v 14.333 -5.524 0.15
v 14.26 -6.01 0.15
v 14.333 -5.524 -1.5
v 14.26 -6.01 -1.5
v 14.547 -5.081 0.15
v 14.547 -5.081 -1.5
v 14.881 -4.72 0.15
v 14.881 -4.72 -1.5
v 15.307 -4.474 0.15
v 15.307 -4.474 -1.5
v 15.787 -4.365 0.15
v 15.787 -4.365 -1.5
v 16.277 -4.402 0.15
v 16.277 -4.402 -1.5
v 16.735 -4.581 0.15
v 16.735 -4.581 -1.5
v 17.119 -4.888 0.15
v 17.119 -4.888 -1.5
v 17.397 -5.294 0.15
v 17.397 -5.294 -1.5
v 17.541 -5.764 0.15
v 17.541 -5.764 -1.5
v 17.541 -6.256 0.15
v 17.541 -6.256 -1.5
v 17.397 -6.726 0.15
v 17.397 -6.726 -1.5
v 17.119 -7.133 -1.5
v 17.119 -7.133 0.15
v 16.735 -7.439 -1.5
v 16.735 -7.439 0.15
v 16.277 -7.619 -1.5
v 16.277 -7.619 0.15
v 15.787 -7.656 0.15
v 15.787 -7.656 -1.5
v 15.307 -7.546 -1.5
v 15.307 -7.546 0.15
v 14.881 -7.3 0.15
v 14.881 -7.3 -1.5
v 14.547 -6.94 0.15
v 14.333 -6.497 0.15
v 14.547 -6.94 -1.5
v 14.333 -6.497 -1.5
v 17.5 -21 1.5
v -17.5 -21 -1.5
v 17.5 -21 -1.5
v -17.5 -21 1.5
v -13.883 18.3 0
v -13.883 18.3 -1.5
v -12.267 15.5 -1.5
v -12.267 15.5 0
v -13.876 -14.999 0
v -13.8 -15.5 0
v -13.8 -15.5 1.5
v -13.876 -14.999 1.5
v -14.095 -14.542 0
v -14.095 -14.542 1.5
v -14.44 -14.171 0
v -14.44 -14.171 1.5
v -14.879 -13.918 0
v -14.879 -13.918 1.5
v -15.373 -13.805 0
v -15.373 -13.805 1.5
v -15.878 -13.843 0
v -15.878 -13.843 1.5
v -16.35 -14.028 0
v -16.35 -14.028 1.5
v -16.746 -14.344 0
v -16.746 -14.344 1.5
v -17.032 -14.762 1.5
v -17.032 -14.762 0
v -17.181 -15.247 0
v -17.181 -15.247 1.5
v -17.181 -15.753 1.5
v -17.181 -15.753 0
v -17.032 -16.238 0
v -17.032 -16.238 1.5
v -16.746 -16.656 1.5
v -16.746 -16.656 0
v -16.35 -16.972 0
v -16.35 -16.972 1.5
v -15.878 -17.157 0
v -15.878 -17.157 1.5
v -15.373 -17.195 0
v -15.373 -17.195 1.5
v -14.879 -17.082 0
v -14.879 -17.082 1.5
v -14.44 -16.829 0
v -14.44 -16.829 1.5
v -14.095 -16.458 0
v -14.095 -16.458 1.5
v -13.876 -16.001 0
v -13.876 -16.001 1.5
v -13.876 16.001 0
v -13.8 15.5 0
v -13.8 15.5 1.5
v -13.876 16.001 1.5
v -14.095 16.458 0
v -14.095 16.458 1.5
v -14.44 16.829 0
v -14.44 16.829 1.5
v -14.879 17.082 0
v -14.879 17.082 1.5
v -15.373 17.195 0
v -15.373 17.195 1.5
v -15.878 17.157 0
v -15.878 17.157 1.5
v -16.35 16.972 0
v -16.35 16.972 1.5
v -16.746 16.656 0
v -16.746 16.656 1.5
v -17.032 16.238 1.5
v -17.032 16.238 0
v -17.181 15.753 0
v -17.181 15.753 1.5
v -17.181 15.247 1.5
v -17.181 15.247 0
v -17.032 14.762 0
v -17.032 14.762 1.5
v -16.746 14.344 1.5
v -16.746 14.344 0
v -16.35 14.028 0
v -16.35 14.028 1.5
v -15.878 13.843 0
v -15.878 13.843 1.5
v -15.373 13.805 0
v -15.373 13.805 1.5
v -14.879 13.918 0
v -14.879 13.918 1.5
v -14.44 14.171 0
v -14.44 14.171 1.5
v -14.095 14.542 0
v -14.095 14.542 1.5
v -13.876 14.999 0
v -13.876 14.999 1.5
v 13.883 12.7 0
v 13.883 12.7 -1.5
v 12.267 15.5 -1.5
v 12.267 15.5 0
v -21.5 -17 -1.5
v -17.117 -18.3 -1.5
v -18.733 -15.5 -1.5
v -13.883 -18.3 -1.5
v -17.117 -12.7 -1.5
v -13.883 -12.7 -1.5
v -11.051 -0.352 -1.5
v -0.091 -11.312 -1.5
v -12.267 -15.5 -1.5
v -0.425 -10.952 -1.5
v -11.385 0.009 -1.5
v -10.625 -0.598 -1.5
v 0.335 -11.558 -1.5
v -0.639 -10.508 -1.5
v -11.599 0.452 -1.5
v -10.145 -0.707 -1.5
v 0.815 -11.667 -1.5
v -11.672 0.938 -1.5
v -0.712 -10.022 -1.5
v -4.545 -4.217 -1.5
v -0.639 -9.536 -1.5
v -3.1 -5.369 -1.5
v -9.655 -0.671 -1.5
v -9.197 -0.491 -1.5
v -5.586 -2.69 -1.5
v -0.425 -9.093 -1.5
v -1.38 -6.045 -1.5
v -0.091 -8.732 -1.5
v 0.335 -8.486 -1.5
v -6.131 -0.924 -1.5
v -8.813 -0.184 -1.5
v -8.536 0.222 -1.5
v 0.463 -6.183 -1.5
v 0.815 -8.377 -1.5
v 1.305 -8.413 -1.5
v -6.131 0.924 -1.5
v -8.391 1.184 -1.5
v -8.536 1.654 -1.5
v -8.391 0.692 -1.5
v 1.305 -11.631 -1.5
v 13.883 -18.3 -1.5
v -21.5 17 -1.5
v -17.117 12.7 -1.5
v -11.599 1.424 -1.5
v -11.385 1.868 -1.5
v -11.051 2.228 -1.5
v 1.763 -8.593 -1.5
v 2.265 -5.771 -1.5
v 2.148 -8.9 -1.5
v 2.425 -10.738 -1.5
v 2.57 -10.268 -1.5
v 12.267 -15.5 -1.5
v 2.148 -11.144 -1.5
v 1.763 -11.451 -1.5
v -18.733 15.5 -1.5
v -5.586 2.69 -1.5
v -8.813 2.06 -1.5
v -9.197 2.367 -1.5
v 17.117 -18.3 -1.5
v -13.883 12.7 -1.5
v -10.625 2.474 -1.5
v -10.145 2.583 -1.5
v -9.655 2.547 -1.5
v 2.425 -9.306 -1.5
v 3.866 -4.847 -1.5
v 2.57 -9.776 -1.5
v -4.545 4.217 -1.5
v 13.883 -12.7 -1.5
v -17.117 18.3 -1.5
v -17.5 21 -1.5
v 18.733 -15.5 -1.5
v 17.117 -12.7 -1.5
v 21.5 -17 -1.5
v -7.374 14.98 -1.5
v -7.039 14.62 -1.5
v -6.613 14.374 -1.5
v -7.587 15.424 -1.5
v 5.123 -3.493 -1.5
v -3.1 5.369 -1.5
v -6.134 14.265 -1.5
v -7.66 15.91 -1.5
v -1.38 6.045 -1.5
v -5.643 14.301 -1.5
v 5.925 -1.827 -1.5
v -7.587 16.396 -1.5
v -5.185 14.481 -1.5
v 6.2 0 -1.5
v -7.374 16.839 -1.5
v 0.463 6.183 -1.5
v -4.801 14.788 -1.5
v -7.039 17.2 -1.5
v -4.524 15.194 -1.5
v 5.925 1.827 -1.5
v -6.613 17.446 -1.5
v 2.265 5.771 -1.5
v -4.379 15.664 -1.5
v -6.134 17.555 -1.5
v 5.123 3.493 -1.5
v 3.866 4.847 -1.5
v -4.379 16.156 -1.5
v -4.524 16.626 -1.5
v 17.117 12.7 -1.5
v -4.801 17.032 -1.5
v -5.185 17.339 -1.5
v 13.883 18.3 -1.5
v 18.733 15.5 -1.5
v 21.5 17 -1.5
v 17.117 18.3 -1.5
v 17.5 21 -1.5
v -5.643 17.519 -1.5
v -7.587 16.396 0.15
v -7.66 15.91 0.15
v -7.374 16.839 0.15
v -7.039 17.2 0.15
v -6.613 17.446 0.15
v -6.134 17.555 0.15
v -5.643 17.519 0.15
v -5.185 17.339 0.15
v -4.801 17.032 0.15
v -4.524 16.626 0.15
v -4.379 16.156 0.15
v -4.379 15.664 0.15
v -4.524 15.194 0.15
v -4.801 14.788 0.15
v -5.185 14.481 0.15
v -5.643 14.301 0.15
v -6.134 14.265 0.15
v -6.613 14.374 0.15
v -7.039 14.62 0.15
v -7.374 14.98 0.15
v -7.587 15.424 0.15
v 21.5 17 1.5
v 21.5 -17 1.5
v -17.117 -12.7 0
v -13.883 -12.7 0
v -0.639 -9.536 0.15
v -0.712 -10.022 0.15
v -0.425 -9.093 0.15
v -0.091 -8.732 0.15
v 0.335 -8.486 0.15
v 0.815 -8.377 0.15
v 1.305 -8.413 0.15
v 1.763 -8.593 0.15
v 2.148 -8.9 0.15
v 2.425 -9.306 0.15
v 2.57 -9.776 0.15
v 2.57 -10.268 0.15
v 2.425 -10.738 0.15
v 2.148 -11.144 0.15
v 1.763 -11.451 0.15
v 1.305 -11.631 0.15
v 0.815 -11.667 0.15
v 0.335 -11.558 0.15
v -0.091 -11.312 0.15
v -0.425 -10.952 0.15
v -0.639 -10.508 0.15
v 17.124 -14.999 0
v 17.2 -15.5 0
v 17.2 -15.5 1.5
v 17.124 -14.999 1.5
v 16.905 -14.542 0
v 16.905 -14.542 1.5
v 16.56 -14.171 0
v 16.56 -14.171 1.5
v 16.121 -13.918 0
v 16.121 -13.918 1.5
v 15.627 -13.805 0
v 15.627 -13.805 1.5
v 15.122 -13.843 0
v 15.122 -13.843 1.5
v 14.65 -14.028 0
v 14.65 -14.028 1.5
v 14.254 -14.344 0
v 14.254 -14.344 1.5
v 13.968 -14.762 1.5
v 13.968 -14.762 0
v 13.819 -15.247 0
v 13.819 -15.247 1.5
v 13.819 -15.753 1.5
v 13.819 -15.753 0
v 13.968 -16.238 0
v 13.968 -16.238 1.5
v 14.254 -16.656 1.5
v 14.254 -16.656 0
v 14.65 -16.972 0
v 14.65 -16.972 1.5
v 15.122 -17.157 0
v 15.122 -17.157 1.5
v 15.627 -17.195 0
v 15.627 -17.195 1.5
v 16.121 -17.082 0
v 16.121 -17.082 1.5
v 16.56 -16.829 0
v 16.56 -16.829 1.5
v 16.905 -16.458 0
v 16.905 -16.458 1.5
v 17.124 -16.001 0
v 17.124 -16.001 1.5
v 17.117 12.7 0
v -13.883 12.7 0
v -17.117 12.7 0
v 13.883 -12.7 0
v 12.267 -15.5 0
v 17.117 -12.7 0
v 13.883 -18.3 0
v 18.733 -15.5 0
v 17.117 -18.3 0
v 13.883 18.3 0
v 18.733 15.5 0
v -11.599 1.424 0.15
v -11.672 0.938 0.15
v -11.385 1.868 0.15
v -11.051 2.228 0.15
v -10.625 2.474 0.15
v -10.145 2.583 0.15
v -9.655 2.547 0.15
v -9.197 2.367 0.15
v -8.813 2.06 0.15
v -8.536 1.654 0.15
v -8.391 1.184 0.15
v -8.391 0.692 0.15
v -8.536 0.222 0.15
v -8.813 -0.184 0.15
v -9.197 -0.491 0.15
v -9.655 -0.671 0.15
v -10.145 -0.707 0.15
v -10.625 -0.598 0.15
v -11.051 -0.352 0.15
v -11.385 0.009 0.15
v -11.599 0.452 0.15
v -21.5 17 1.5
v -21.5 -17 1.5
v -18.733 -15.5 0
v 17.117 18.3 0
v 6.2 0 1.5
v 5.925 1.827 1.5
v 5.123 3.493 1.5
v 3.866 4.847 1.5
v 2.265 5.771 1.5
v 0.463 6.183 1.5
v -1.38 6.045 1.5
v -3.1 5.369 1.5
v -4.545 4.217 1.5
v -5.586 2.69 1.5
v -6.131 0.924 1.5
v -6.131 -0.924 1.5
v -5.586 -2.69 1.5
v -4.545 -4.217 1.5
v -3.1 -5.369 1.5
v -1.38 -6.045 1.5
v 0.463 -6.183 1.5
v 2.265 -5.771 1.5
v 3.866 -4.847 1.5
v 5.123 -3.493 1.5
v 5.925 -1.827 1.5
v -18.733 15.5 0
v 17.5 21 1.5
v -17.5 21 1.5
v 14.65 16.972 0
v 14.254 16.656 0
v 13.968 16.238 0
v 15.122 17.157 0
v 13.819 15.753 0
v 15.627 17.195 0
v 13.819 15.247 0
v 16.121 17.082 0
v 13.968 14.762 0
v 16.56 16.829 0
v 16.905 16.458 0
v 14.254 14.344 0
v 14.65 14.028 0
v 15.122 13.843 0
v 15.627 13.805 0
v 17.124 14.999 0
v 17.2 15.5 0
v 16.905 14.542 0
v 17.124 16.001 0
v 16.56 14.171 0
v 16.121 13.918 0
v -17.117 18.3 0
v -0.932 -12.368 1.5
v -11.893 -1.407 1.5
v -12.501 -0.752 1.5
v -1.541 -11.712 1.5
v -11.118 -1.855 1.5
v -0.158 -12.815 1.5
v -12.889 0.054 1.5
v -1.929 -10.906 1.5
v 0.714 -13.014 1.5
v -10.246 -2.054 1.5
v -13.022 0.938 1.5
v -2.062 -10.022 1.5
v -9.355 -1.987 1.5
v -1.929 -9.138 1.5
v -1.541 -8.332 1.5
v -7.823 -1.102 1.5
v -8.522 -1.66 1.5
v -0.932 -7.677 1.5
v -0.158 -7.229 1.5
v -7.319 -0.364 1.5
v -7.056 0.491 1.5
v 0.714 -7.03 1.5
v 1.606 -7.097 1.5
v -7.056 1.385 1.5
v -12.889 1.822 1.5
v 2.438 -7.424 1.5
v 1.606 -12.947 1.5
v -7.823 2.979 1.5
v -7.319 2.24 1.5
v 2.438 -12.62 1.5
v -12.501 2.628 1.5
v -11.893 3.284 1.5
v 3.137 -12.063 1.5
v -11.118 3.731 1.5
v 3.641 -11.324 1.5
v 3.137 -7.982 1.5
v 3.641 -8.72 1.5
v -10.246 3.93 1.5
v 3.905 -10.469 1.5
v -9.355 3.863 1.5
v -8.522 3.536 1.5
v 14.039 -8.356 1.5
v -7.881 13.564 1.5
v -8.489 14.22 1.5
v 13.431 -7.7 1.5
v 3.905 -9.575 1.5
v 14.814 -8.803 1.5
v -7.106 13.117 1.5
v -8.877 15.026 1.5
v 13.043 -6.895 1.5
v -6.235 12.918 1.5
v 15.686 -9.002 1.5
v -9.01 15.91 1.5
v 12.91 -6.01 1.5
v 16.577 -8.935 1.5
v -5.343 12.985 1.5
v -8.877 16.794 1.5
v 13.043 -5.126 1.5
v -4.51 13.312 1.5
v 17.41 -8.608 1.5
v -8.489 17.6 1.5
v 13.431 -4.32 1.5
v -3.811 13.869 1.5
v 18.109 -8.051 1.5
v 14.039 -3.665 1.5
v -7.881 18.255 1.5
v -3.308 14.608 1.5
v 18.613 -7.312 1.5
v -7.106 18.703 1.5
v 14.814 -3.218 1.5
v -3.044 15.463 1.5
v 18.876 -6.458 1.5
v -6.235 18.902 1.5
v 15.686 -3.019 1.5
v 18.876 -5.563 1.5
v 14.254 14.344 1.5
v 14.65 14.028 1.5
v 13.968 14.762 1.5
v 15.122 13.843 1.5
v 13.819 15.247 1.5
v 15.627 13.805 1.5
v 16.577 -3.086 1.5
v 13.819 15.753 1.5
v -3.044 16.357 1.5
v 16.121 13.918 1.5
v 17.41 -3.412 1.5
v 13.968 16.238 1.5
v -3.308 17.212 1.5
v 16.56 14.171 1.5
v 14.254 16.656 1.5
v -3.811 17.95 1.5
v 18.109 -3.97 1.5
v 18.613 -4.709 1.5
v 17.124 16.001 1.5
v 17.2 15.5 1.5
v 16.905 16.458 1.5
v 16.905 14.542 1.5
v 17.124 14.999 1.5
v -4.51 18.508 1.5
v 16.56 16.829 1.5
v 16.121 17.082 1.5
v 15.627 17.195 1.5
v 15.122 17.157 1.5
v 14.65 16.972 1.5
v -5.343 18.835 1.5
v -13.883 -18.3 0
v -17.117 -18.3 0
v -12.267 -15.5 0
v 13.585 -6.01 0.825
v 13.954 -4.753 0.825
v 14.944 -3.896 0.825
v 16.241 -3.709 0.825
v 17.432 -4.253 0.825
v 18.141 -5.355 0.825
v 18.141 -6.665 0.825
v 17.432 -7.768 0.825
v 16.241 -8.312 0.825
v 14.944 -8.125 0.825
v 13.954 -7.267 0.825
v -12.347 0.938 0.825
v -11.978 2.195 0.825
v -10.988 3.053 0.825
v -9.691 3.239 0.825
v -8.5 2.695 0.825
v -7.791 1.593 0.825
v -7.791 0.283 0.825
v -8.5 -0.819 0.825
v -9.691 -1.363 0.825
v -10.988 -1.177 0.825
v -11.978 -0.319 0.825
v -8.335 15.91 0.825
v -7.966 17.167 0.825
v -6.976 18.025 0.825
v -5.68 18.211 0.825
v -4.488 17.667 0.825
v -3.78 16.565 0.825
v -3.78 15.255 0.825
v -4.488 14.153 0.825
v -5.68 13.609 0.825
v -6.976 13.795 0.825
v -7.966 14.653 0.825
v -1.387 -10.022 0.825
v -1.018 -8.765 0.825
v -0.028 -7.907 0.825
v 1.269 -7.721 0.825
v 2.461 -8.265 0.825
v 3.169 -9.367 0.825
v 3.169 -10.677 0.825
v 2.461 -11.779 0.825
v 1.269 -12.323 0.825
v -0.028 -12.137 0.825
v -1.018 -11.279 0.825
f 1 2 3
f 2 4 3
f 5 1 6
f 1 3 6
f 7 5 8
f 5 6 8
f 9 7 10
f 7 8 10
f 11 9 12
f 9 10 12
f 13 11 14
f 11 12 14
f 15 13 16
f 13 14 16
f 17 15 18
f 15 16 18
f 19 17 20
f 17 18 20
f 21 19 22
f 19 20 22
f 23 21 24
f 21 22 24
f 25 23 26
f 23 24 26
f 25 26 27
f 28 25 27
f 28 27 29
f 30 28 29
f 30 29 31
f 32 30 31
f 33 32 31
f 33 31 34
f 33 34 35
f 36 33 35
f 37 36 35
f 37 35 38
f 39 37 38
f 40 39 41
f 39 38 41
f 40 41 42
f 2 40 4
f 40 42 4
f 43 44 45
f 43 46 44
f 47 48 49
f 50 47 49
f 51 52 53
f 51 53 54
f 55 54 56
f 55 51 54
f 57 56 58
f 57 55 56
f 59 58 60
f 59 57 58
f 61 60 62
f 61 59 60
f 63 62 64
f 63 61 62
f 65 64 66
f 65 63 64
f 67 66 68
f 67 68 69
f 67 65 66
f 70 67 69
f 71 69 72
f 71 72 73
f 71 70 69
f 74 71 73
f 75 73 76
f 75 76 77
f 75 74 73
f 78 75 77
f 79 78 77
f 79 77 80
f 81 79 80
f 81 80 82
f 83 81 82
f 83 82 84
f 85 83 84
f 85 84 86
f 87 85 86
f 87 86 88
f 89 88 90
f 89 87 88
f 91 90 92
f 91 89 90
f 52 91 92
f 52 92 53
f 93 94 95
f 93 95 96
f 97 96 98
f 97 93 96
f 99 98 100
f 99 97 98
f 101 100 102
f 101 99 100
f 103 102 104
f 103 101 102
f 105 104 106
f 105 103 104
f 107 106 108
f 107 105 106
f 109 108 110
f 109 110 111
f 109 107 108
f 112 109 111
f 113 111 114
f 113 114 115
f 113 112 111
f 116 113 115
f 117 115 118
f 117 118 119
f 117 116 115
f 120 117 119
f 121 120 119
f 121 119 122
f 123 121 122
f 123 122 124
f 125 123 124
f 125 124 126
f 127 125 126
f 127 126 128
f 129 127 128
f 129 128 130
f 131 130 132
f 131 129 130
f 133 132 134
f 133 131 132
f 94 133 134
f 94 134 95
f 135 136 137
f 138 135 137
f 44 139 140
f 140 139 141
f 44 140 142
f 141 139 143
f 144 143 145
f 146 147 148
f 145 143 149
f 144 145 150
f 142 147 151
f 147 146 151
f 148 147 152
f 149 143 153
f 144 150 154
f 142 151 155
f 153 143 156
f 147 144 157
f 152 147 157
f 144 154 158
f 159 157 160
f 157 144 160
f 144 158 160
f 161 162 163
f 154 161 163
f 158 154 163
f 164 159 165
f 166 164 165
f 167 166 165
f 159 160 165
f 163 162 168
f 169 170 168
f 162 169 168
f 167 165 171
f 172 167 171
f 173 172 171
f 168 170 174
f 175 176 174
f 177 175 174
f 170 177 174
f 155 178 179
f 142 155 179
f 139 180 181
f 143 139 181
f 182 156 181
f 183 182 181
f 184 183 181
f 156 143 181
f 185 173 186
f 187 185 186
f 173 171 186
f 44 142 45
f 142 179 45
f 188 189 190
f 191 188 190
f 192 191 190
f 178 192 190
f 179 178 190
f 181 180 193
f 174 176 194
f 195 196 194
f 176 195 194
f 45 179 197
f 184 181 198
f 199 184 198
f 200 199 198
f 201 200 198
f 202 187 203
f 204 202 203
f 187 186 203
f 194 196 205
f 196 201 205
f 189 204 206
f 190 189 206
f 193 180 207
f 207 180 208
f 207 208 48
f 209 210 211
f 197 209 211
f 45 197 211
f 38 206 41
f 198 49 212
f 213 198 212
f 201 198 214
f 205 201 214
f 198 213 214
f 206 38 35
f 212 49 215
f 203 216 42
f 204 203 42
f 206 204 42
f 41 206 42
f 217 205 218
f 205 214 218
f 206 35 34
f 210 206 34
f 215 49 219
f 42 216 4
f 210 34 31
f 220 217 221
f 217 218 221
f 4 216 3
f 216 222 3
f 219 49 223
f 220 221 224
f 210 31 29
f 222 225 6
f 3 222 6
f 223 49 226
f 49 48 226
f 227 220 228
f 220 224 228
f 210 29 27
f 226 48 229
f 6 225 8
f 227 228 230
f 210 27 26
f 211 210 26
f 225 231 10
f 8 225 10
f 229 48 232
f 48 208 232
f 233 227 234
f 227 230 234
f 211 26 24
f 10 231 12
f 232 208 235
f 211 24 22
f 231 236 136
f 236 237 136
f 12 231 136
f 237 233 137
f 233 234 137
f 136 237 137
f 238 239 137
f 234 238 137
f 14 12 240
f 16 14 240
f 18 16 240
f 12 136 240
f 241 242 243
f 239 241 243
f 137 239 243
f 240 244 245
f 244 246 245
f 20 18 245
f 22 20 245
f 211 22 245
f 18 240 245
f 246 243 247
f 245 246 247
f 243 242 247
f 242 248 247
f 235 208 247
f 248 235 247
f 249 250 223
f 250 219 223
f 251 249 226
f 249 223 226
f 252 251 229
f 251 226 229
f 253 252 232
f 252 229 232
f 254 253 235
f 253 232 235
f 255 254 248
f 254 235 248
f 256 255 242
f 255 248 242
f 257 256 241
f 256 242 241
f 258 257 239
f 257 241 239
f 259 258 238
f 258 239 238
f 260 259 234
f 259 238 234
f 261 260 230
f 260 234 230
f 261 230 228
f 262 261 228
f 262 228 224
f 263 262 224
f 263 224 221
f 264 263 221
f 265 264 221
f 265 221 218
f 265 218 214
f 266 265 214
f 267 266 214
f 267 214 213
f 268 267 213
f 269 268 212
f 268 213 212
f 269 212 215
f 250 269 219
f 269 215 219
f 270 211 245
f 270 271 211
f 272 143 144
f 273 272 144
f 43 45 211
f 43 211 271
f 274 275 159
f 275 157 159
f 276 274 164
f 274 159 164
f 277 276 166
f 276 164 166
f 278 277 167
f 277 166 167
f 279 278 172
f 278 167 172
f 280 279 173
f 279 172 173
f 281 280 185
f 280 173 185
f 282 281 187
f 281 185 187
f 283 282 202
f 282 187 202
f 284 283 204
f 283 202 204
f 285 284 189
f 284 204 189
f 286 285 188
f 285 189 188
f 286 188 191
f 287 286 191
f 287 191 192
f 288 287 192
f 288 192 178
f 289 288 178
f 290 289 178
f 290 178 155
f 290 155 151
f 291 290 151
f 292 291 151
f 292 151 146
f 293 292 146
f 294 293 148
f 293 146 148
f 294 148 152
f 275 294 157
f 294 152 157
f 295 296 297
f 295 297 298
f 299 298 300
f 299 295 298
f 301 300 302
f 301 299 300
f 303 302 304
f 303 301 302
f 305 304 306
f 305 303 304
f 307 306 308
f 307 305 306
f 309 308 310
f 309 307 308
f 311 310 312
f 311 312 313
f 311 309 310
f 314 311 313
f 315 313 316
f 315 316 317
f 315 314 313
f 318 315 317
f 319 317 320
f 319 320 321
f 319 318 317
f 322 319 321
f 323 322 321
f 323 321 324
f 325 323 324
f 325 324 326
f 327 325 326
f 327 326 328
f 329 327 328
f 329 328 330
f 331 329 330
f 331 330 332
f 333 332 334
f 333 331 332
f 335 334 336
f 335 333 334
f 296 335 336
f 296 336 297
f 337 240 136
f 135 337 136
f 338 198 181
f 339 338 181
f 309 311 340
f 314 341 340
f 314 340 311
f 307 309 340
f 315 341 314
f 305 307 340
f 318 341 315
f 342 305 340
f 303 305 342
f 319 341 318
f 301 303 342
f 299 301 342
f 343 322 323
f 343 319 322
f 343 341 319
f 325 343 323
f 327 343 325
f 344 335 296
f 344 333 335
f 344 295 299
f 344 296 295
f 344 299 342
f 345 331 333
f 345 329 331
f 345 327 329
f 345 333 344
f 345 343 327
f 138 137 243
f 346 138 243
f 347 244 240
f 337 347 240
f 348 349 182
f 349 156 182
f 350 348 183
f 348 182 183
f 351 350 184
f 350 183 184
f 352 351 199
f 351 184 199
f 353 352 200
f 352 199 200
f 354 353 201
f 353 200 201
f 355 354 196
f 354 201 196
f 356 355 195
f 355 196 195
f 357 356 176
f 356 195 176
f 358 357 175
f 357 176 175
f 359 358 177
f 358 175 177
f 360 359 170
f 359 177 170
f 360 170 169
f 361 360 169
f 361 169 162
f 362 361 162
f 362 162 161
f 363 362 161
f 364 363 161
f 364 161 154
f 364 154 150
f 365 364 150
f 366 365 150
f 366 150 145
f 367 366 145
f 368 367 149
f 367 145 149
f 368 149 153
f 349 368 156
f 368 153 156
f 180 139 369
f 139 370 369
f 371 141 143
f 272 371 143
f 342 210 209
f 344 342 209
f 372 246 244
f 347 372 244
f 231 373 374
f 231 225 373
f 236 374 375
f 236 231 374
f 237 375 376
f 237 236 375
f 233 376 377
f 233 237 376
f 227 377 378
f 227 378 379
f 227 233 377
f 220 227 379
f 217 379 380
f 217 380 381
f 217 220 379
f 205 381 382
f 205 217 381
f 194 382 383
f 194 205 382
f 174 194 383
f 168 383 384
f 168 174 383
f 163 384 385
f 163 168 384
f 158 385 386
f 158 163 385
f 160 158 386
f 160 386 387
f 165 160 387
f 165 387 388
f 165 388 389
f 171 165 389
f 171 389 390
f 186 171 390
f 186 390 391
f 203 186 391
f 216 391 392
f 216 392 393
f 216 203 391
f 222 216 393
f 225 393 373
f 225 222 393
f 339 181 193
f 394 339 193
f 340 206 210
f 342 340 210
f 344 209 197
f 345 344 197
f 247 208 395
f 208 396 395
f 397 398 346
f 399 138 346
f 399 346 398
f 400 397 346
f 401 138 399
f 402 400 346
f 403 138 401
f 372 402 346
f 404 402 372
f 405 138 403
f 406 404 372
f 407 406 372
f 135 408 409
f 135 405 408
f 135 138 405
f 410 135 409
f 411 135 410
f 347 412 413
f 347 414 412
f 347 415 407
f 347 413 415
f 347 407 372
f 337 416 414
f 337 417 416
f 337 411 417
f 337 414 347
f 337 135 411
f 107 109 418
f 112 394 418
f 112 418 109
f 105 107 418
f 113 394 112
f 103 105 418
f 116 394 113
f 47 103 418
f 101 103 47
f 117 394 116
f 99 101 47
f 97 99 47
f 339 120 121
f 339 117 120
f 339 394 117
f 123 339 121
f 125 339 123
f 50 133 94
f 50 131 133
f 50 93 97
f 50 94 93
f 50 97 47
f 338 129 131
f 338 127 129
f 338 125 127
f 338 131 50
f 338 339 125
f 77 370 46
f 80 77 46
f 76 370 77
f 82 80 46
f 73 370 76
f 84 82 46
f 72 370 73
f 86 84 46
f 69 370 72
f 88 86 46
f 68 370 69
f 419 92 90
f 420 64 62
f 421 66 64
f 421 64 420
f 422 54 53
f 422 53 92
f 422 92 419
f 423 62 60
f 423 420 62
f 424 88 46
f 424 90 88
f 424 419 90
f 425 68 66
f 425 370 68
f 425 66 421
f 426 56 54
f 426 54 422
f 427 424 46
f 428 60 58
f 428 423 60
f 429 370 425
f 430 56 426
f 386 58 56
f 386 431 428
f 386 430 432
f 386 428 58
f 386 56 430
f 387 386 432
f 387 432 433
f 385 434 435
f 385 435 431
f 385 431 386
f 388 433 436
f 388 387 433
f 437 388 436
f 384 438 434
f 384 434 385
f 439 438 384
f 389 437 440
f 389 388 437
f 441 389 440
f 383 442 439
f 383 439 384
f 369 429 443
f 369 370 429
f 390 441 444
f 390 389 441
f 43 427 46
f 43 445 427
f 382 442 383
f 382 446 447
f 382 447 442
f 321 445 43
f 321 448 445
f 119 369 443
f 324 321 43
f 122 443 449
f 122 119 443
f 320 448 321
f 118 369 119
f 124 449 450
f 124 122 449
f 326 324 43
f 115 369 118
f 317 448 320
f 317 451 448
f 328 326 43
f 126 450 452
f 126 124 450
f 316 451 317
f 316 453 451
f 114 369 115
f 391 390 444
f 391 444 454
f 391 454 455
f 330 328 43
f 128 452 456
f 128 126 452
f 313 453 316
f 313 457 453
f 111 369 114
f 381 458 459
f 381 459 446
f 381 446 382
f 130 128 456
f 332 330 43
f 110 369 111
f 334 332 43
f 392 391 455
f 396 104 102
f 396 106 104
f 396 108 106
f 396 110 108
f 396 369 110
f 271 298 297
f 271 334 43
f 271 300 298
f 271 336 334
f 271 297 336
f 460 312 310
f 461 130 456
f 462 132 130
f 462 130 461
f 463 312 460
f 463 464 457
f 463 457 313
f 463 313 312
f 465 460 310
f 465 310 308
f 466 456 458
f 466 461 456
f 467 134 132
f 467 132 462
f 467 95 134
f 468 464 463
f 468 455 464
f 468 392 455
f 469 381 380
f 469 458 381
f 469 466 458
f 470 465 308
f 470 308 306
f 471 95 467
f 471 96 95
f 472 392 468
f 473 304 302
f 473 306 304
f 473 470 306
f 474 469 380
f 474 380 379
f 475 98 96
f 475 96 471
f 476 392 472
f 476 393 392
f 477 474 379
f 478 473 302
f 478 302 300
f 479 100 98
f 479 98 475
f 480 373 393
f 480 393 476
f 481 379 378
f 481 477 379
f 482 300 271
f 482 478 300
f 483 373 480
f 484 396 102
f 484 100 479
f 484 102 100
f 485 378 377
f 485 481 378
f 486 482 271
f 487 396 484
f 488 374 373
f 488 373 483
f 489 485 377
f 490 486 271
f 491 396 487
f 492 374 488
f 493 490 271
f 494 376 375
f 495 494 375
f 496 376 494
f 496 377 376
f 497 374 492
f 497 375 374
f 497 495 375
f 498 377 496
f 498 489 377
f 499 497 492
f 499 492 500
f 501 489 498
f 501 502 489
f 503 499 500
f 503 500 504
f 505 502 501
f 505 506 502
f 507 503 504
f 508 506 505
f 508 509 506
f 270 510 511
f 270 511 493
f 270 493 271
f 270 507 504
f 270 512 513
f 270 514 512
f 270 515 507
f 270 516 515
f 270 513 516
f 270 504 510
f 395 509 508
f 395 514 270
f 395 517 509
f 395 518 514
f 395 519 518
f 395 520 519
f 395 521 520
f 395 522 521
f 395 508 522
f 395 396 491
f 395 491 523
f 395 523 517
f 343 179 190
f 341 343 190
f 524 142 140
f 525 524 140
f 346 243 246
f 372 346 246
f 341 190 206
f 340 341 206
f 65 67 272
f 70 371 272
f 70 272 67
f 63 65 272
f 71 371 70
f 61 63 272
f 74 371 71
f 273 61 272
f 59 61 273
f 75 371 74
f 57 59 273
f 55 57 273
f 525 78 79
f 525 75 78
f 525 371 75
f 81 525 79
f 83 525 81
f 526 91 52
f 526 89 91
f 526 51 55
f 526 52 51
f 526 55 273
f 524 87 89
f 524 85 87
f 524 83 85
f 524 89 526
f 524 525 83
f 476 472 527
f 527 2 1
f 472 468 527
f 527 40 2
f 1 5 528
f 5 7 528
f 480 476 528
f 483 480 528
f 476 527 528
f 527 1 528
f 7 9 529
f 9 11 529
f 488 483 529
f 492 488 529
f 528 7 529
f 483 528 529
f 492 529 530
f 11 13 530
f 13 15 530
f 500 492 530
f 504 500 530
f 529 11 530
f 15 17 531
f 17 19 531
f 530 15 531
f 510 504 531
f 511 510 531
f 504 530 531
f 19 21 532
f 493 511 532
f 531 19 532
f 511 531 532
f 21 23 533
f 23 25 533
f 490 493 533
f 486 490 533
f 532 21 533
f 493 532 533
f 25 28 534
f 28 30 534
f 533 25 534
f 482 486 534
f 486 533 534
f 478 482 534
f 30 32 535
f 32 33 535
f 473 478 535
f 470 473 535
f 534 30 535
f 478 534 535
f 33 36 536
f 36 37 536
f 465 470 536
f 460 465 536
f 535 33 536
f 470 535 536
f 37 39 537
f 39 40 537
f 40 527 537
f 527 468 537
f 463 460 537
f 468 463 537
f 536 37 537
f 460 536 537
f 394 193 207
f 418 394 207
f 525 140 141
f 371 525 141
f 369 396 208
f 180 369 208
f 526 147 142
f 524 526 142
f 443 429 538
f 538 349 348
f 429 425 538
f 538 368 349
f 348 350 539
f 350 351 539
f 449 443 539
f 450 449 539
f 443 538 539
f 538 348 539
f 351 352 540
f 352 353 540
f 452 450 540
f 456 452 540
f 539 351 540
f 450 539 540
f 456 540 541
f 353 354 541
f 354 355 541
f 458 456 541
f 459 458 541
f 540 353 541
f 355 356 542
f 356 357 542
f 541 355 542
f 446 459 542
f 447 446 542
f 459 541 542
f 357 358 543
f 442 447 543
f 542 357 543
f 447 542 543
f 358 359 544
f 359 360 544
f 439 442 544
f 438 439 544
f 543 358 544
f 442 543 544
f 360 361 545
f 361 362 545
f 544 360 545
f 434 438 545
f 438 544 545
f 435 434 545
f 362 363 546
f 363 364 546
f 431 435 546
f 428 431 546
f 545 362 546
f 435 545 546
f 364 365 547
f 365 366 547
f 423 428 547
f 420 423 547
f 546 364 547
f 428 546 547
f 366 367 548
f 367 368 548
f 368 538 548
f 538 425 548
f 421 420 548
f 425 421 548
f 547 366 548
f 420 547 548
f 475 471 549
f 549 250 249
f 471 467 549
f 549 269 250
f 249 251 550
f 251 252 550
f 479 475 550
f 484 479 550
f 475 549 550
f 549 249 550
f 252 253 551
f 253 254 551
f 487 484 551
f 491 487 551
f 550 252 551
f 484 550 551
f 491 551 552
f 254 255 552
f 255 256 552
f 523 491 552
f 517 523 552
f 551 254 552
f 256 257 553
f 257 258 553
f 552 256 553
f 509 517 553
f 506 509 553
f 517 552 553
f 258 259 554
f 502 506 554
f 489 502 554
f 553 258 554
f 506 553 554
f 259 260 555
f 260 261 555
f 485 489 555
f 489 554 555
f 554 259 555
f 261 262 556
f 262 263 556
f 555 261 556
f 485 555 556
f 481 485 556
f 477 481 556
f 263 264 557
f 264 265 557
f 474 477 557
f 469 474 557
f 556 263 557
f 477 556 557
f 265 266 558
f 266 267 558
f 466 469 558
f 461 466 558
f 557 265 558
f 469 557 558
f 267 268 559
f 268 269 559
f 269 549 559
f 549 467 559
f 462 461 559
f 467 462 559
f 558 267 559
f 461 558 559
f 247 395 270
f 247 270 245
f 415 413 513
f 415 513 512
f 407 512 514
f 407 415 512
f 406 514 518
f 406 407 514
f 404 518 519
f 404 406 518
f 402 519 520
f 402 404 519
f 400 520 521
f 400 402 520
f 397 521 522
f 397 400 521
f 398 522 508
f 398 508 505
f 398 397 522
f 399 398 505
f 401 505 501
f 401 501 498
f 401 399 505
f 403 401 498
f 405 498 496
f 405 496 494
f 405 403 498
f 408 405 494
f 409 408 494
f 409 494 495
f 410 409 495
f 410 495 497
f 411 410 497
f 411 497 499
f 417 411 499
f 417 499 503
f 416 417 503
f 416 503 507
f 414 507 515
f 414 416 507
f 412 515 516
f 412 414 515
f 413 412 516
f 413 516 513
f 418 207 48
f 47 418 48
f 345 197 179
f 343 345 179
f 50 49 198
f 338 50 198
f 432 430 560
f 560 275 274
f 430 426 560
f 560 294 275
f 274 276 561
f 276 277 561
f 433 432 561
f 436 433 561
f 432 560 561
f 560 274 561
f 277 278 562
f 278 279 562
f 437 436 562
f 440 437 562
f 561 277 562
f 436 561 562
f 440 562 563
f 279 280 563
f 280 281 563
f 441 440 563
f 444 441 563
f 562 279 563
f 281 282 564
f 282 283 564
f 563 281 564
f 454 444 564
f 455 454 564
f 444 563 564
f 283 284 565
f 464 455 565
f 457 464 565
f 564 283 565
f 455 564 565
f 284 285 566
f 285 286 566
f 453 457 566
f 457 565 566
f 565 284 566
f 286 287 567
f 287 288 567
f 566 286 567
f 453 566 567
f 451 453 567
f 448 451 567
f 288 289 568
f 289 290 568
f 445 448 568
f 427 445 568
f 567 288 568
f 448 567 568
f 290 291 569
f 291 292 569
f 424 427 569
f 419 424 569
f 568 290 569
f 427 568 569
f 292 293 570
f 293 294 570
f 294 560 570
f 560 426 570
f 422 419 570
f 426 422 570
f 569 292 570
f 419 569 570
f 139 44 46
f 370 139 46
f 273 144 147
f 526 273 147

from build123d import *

# Parameters (mm, degrees)
SKETCH_W         = 43
SKETCH_H         = 42
SKETCH_R         = 6.2
SKETCH_R_2       = 1.7
PAD_DEPTH        = 1.5
HOLE_D           = 3.3
HOLE_CSINK_D     = 6
HOLE_CSINK_ANGLE = 90
POCKET_DEPTH     = 1.5
CHAMFER_SIZE     = 4


with BuildPart() as part:
    # Sketch → Pad (new body, symmetric)
    with BuildSketch(Plane.XY):
        Rectangle(SKETCH_W, SKETCH_H)
        Circle(SKETCH_R, mode=Mode.SUBTRACT)
        with Locations((-15.5, 15.5)):
            Circle(SKETCH_R_2, mode=Mode.SUBTRACT)
        with Locations((15.5, 15.5)):
            Circle(SKETCH_R_2, mode=Mode.SUBTRACT)
        with Locations((-15.5, -15.5)):
            Circle(SKETCH_R_2, mode=Mode.SUBTRACT)
        with Locations((15.5, -15.5)):
            Circle(SKETCH_R_2, mode=Mode.SUBTRACT)
    extrude(amount=PAD_DEPTH, both=True)

    # Hole (through all)
    with Locations(Plane.XY.offset(1.5)):
        with Locations((15.909903, -6.010408), (0.938052, -10.022103), (-6.010408, 15.909903), (-10.022103, 0.938052)):
            CounterSinkHole(HOLE_D / 2, HOLE_CSINK_D / 2, counter_sink_angle=HOLE_CSINK_ANGLE)

    # Sketch004 (on Face4 of Hole) → Pocket (cut)
    with BuildSketch(Plane(origin=(0, 0, -1.5), x_dir=(1, 0, 0), z_dir=(0, 0, -1))):
        Polygon((-13.883419, 12.7), (-12.266838, 15.5), (-13.883419, 18.3), (-17.116581, 18.3), (-18.733162, 15.5), (-17.116581, 12.7), align=None)
        Polygon((13.883419, 12.7), (17.116581, 12.7), (18.733162, 15.5), (17.116581, 18.3), (13.883419, 18.3), (12.266838, 15.5), align=None)
        Polygon((17.116581, -12.7), (13.883419, -12.7), (12.266838, -15.5), (13.883419, -18.3), (17.116581, -18.3), (18.733162, -15.5), align=None)
        Polygon((-13.883419, -12.7), (-17.116581, -12.7), (-18.733162, -15.5), (-17.116581, -18.3), (-13.883419, -18.3), (-12.266838, -15.5), align=None)
    extrude(amount=-POCKET_DEPTH, mode=Mode.SUBTRACT)

    # Chamfer
    chamfer_edges = [part.edges().sort_by_distance(p)[0] for p in [
        (21.5, -21, 0),
        (21.5, 21, 0),
        (-21.5, 21, 0),
        (-21.5, -21, 0),
    ]]
    chamfer(chamfer_edges, length=CHAMFER_SIZE)


solid = part.part
